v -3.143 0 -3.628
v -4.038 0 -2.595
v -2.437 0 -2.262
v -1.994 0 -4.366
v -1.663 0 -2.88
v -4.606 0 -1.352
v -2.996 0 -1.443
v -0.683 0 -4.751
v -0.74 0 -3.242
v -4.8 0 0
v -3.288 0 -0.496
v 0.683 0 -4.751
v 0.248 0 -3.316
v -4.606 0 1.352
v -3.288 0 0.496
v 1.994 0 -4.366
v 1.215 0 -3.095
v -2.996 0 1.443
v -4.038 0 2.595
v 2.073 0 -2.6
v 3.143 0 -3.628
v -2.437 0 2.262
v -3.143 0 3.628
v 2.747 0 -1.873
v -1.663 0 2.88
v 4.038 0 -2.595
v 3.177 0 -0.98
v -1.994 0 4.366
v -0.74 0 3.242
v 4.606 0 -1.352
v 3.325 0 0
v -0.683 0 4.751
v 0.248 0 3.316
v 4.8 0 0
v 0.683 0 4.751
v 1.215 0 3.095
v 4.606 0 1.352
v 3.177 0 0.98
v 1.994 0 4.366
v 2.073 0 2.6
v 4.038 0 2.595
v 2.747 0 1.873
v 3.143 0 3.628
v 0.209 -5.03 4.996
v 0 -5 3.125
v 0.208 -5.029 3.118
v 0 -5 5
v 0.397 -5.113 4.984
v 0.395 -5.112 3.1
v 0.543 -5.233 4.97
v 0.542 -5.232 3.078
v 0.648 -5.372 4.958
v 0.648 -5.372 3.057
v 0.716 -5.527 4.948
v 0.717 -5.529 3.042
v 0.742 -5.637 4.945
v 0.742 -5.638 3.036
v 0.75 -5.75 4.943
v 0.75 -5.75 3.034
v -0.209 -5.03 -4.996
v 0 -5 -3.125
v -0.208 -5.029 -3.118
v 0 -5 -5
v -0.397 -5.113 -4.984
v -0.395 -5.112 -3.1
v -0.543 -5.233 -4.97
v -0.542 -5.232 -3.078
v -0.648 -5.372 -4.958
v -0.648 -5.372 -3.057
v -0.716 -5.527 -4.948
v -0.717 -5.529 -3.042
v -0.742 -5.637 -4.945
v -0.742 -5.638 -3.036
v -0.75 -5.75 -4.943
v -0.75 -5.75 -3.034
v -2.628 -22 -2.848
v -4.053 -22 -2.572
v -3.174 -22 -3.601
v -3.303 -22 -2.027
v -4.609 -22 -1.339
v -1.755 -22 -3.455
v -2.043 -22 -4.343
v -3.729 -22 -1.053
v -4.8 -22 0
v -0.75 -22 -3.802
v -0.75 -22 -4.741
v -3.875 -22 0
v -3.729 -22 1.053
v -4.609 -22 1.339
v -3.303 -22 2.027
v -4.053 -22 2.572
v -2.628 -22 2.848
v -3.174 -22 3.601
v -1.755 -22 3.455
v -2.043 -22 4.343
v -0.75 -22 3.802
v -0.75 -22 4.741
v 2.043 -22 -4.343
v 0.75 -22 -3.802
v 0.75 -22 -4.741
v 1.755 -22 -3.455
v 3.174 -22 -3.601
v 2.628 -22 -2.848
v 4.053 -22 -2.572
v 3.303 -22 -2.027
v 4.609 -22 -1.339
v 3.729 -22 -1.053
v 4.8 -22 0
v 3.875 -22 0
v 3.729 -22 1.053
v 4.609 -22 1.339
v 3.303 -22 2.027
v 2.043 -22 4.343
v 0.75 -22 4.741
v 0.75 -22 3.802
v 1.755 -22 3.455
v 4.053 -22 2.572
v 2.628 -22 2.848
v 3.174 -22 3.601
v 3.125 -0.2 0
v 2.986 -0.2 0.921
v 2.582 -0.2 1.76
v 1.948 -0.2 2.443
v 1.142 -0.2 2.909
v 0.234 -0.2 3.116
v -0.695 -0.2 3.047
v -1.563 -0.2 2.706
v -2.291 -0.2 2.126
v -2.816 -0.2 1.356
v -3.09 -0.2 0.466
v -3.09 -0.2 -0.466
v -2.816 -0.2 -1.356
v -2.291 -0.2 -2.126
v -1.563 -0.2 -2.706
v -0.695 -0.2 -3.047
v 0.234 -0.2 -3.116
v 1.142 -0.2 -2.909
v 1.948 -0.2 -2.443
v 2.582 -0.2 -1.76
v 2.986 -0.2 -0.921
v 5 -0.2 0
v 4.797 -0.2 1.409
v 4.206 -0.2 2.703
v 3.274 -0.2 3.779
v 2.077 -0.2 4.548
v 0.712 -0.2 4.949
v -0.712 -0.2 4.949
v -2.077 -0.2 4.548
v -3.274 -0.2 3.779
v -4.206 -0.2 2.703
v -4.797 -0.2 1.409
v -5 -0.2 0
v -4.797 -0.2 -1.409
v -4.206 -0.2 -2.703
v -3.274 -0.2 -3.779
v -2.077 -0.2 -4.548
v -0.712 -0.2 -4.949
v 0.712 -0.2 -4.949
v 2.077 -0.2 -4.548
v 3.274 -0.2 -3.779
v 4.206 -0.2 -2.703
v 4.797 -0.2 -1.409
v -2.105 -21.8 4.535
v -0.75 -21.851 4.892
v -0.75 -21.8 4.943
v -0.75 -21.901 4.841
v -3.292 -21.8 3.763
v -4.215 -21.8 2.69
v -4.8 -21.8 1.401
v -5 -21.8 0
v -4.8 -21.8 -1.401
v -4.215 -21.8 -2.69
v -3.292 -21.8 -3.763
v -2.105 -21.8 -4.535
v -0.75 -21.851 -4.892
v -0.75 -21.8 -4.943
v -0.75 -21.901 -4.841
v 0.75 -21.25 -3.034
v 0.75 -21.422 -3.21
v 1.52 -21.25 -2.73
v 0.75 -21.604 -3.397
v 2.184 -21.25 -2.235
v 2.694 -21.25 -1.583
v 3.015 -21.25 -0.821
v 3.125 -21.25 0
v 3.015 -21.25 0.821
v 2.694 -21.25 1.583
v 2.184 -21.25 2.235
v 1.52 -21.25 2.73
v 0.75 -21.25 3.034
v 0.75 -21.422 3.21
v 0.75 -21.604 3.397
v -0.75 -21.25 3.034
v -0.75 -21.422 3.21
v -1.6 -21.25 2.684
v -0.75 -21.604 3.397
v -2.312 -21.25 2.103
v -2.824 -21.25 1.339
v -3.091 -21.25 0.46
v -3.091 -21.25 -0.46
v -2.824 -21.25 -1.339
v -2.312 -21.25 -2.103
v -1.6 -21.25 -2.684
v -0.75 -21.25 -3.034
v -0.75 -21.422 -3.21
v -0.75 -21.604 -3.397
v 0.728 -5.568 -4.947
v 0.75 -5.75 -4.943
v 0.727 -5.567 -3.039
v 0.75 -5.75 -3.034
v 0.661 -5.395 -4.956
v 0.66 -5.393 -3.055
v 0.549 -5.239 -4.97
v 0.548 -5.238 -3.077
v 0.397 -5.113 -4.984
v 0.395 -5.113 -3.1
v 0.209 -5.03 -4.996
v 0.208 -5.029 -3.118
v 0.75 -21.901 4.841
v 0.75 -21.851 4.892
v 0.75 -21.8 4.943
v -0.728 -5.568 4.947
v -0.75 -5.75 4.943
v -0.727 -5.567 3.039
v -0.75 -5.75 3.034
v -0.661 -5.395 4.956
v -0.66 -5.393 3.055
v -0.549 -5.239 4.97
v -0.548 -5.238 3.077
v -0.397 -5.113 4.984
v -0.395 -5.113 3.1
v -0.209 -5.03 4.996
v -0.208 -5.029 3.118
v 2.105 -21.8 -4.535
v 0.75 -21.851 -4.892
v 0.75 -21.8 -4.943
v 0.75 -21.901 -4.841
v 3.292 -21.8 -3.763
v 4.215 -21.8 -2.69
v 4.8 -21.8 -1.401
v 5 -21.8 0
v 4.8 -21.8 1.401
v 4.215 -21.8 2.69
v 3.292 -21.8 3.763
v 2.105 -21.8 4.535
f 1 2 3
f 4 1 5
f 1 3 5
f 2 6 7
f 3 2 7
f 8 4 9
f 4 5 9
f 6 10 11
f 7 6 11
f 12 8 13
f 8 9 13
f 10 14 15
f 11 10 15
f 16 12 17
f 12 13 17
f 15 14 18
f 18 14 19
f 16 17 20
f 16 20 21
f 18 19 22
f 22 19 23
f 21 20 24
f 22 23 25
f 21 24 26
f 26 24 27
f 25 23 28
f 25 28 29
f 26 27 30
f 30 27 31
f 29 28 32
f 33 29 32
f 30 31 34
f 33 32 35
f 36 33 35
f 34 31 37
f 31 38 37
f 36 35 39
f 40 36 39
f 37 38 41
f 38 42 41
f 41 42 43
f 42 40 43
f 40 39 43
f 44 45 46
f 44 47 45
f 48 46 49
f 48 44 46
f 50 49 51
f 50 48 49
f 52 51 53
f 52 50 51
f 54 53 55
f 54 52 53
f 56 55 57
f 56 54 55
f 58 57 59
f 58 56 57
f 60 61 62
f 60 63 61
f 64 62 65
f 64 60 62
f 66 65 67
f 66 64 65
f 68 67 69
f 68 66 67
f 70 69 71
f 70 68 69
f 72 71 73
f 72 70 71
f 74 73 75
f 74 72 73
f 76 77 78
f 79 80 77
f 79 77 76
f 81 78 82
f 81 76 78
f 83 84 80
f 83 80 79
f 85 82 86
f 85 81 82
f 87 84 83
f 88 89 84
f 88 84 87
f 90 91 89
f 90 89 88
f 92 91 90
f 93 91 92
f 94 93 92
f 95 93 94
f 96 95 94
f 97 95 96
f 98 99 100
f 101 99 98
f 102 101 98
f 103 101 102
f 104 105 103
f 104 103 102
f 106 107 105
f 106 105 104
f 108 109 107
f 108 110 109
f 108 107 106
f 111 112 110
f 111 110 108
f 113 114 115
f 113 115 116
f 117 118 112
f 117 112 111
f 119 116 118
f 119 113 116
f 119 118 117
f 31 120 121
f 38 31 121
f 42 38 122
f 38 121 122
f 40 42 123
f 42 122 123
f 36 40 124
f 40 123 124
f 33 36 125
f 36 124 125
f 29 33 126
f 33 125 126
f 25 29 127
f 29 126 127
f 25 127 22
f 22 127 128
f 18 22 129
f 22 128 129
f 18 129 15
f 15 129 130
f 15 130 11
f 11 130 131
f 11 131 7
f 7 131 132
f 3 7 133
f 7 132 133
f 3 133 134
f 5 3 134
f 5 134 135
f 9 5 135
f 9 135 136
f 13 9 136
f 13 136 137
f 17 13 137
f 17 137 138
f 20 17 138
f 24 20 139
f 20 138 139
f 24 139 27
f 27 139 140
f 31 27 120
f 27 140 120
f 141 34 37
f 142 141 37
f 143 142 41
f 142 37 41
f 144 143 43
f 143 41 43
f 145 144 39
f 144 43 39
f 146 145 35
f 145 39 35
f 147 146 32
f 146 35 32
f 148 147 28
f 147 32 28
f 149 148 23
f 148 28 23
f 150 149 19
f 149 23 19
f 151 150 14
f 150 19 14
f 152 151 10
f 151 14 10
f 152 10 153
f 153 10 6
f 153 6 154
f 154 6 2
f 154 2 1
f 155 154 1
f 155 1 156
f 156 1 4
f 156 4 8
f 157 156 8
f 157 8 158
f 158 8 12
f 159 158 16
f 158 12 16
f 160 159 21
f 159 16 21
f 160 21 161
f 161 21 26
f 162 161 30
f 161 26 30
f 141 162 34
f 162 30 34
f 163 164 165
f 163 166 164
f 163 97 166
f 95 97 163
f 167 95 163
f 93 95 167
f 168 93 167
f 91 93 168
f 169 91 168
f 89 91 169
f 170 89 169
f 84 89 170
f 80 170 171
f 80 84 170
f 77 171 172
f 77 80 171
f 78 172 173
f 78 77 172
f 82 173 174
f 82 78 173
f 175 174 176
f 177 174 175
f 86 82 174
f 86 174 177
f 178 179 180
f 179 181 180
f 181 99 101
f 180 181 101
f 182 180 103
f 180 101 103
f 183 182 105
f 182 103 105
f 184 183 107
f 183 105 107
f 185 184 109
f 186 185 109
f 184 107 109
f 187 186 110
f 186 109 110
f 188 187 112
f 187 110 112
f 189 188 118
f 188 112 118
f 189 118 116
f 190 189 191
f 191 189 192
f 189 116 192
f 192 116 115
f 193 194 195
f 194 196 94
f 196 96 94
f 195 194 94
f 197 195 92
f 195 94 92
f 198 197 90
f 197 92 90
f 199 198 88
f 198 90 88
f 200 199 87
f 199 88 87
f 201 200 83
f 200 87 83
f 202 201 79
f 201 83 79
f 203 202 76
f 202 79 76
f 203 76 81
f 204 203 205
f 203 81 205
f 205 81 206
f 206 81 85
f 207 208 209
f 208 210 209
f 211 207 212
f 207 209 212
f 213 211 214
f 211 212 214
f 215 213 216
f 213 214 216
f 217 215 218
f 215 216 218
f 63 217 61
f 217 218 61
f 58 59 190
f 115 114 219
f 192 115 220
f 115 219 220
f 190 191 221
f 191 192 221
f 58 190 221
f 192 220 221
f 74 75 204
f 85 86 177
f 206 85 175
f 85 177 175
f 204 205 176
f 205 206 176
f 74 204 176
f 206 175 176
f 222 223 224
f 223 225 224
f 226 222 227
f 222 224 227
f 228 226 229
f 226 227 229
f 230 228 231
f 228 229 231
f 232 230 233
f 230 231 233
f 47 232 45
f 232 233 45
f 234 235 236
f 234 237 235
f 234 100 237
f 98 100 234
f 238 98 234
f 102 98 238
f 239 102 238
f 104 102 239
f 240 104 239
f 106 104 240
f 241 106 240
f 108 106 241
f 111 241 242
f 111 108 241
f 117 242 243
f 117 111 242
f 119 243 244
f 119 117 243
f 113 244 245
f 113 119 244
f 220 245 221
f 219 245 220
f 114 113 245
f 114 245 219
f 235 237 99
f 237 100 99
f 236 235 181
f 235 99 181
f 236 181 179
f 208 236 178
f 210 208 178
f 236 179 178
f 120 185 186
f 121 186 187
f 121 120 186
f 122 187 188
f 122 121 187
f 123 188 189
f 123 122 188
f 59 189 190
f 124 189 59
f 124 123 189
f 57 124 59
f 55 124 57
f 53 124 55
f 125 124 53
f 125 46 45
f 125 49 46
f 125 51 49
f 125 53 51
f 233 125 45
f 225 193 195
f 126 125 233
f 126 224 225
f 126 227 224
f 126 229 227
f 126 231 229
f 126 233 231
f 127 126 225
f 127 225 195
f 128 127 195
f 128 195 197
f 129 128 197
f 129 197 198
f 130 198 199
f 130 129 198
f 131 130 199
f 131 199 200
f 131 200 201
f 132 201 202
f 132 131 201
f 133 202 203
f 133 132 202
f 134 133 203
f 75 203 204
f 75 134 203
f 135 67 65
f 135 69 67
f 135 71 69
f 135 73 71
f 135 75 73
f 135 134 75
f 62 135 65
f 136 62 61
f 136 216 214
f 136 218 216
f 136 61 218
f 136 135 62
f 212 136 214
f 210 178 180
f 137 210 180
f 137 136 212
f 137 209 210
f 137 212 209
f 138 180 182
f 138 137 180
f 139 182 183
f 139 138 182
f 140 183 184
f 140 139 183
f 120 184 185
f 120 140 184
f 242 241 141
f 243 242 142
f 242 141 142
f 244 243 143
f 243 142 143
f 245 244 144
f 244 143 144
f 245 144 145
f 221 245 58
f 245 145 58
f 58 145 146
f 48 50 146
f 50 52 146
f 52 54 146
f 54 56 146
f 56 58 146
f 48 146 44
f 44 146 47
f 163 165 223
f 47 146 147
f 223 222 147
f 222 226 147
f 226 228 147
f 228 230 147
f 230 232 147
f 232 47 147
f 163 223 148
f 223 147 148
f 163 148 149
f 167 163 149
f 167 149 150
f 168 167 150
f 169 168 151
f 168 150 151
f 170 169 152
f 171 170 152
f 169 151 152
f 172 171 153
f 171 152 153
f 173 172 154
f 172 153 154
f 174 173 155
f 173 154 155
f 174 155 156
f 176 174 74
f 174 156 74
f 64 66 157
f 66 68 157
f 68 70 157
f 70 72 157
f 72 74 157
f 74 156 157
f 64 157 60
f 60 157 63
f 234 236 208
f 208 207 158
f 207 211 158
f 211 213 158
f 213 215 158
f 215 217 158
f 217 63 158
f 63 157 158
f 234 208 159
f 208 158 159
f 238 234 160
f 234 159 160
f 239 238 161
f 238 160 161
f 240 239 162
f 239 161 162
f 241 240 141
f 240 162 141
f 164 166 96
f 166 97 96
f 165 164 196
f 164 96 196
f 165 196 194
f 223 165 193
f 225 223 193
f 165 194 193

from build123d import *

# Parameters (mm, degrees)
F0_R     = 5
F0_R_2   = 3.125
F1_DEPTH = 22
F3_DEPTH = 17
F4_SIZE  = 0.2
F5_SIZE  = 0.75
F6_R     = 0.7499


# Not quite as in the source:
# - a fillet or chamfer is up to 0.001 mm smaller than in the source, because OpenCascade refuses the exact size


with BuildPart() as f1:
    # F0 (on Front) → F1 (new body)
    with BuildSketch(Plane.XZ):
        Circle(F0_R)
        Circle(F0_R_2, mode=Mode.SUBTRACT)
    extrude(amount=F1_DEPTH)

    # F2 (on face) → F3 (cut)
    with BuildSketch(Plane.XZ.offset(22)):
        with BuildLine():
            ThreePointArc((0.75, 4.9434299833), (0, 5), (-0.75, 4.9434299833))
            Line((-0.75, 4.9434299833), (-0.75, 3.0336652749))
            ThreePointArc((-0.75, 3.0336652749), (0, 3.125), (0.75, 3.0336652749))
            Line((0.75, 3.0336652749), (0.75, 4.9434299833))
        make_face()
        with BuildLine():
            ThreePointArc((-0.75, -4.9434299833), (0, -5), (0.75, -4.9434299833))
            Line((0.75, -4.9434299833), (0.75, -3.0336652749))
            ThreePointArc((0.75, -3.0336652749), (0, -3.125), (-0.75, -3.0336652749))
            Line((-0.75, -3.0336652749), (-0.75, -4.9434299833))
        make_face()
    extrude(amount=-F3_DEPTH, mode=Mode.SUBTRACT)

    # F4
    f4_edges = [f1.edges().sort_by_distance(p)[0] for p in [
        (-5, 0, 0),
        (-5, -22, 0),
        (3.791438, -22, -3.259601),
        (-3.125, 0, 0),
    ]]
    chamfer(f4_edges, length=F4_SIZE)

    # F5
    f5_edges = [f1.edges().sort_by_distance(p)[0] for p in [
        (-3.125, -22, 0),
        (2.460627, -22, -1.926379),
    ]]
    chamfer(f5_edges, length=F5_SIZE)

    # F6 (radius 0.75 in the source; OpenCascade refuses exactly that, so slightly less here)
    f6_edges = [f1.edges().sort_by_distance(p)[0] for p in [
        (0.75, -5, -3.988548),
        (-0.75, -5, 3.988548),
        (-0.75, -5, -3.988548),
        (0.75, -5, 3.988548),
    ]]
    fillet(f6_edges, radius=F6_R)


solid = f1.part
